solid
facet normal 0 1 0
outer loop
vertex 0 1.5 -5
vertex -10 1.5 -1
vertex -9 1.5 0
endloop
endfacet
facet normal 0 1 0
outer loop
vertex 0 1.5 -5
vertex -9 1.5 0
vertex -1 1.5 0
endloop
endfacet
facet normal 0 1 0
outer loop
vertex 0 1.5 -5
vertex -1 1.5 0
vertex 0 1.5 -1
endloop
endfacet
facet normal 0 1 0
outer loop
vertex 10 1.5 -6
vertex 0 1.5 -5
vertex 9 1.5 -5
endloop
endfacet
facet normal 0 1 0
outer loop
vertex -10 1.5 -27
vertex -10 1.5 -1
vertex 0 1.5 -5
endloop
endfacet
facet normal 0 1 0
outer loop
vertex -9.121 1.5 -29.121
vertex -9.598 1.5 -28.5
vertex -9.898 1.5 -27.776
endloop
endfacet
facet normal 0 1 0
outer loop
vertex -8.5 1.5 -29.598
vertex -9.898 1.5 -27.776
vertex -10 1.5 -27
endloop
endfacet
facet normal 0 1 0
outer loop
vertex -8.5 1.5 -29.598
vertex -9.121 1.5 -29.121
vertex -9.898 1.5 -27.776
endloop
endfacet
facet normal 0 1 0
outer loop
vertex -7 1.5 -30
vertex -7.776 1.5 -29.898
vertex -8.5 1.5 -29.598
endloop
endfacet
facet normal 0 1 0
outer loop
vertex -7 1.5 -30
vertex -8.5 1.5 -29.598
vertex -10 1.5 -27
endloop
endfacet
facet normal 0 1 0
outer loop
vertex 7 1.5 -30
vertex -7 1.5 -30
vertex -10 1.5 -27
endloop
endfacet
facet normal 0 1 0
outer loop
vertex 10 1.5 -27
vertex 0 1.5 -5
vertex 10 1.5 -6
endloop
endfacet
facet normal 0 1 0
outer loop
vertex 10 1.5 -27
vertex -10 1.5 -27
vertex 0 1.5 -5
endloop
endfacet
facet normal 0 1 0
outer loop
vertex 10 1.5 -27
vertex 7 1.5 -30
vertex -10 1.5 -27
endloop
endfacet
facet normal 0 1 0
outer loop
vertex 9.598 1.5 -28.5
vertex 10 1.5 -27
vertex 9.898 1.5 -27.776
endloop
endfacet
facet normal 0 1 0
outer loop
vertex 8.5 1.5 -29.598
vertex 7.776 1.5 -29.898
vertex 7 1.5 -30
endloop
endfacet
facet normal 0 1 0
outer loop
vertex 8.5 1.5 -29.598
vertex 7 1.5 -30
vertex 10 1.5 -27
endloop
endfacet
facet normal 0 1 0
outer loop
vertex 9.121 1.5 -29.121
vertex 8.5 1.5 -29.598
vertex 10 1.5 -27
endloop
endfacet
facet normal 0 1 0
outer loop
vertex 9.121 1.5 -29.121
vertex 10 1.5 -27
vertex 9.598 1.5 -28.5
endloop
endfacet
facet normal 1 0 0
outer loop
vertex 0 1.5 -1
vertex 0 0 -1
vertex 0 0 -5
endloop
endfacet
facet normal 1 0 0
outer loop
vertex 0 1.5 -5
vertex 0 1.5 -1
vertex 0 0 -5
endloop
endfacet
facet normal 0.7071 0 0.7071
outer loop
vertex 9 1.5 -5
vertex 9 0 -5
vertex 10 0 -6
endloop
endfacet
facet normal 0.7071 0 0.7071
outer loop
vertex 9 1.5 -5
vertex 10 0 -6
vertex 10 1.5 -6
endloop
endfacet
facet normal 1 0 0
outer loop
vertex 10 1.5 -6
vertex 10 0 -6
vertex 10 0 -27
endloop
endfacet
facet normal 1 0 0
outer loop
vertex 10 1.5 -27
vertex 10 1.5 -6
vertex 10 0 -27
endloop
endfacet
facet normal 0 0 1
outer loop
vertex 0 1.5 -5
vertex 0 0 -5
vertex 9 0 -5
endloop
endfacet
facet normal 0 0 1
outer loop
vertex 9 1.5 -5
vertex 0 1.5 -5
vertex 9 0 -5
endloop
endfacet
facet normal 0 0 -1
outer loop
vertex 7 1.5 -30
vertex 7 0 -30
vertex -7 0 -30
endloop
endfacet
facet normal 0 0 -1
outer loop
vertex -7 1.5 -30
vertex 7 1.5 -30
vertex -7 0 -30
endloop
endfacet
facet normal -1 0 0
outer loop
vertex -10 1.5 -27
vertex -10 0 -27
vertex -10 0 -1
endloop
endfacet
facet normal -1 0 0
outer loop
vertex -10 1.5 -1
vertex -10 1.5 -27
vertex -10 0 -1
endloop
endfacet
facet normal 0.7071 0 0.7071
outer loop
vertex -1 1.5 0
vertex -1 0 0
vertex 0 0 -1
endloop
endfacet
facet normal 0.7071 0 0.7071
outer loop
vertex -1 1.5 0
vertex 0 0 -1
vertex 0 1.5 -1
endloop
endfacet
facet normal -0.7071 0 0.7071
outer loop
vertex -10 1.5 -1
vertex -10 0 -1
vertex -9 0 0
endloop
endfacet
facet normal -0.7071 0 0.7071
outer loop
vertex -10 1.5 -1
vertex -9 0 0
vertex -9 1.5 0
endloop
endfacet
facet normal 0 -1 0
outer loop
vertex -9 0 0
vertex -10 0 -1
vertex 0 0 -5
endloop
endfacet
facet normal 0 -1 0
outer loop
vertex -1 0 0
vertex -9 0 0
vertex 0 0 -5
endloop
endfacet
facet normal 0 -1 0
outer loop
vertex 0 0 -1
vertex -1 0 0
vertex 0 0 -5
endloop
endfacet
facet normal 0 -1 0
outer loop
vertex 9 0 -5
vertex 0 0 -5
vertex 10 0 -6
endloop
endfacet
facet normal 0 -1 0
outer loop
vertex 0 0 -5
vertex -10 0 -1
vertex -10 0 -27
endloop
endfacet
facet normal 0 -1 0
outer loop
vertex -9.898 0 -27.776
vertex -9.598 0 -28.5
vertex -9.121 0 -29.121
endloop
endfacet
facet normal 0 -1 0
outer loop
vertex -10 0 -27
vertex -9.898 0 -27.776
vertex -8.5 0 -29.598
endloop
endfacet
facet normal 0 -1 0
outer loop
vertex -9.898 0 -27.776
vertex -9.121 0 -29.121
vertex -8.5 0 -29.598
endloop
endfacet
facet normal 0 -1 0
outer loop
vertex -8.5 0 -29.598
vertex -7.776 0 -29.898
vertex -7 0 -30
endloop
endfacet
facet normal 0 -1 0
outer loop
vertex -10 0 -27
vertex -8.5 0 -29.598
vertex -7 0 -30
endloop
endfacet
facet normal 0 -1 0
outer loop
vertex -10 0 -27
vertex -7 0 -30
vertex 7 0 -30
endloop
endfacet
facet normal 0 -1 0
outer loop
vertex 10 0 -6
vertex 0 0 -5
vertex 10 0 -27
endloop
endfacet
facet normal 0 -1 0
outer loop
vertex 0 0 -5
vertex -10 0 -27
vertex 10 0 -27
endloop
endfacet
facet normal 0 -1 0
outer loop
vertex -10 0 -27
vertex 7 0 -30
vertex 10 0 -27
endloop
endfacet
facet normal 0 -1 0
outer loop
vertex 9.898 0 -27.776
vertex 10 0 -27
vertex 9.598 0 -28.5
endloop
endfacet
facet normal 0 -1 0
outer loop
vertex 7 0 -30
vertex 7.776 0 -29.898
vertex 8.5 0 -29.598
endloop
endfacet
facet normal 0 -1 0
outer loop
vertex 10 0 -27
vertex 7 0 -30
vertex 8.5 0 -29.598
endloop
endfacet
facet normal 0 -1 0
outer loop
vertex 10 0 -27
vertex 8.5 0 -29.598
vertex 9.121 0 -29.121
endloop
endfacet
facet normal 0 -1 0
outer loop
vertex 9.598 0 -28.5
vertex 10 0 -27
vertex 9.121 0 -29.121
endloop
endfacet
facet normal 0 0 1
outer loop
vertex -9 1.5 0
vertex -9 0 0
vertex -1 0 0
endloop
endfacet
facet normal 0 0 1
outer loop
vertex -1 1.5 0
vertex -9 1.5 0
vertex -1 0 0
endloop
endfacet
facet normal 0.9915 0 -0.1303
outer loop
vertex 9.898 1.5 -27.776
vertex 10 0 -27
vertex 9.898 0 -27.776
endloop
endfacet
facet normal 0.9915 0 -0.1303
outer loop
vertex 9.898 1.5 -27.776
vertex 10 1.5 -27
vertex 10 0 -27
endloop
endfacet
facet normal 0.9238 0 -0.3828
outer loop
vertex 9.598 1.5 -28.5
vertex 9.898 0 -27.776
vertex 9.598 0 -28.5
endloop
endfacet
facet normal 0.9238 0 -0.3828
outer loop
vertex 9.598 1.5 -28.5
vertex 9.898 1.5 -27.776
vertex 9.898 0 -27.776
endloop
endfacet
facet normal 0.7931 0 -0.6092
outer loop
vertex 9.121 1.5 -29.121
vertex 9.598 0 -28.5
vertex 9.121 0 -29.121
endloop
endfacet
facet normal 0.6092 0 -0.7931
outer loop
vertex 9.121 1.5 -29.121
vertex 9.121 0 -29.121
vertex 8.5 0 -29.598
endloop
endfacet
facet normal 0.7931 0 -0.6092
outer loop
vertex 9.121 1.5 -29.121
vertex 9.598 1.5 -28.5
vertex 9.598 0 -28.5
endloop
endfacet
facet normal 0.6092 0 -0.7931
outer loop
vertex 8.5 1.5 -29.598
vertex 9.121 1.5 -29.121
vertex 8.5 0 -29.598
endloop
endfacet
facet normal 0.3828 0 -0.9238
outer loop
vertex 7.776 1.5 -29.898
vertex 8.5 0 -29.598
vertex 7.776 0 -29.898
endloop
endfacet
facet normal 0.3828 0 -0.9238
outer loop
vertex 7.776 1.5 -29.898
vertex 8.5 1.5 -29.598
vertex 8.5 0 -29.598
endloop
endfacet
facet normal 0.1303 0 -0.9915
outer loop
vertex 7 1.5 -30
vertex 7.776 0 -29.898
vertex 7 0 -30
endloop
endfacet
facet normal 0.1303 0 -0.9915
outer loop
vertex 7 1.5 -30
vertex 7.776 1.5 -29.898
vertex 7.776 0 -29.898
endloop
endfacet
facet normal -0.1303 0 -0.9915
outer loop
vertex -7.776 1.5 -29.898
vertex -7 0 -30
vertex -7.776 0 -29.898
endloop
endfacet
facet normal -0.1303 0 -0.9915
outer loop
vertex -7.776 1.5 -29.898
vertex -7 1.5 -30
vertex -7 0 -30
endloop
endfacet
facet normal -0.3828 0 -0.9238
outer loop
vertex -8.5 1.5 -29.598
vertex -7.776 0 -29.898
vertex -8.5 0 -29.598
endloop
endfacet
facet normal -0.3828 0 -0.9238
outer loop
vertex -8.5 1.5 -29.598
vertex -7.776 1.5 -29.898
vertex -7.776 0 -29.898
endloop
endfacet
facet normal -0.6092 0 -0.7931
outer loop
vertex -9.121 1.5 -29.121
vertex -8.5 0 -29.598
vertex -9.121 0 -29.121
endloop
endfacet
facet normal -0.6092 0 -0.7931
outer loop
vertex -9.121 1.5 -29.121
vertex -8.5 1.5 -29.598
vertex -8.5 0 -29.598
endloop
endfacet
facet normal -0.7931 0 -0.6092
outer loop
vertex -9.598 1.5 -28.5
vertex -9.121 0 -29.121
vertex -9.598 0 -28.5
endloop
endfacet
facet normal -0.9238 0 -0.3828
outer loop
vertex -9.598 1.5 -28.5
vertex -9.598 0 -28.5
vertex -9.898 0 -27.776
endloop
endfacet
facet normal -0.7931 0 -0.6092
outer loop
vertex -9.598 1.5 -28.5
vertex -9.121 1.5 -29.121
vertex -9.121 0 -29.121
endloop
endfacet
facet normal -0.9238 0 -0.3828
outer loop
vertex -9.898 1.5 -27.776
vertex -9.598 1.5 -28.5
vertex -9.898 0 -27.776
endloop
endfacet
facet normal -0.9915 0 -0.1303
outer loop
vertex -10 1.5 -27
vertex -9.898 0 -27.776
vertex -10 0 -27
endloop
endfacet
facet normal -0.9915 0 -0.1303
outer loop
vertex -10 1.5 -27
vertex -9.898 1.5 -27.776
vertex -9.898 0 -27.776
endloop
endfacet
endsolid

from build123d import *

# Parameters (mm, degrees)
BOSS_EXTRUDE1_DEPTH = 1.5
FILLET1_R           = 3
CHAMFER1_SIZE       = 1


with BuildPart() as part:
    # Sketch1 → Boss-Extrude1 (new body)
    with BuildSketch(Plane(origin=(0, 0, 0), x_dir=(1, 0, 0), z_dir=(0, 1, 0))):
        Polygon((0, 0), (0, 5), (10, 5), (10, 30), (-10, 30), (-10, 0), align=None)
    extrude(amount=BOSS_EXTRUDE1_DEPTH)

    # Fillet1
    fillet1_edges = [part.edges().sort_by_distance(p)[0] for p in [
        (-10, 0.75, -30),
        (10, 0.75, -30),
    ]]
    fillet(fillet1_edges, radius=FILLET1_R)

    # Chamfer1
    chamfer1_edges = [part.edges().sort_by_distance(p)[0] for p in [
        (-10, 0.75, 0),
        (10, 0.75, -5),
        (0, 0.75, 0),
    ]]
    chamfer(chamfer1_edges, length=CHAMFER1_SIZE)


solid = part.part
